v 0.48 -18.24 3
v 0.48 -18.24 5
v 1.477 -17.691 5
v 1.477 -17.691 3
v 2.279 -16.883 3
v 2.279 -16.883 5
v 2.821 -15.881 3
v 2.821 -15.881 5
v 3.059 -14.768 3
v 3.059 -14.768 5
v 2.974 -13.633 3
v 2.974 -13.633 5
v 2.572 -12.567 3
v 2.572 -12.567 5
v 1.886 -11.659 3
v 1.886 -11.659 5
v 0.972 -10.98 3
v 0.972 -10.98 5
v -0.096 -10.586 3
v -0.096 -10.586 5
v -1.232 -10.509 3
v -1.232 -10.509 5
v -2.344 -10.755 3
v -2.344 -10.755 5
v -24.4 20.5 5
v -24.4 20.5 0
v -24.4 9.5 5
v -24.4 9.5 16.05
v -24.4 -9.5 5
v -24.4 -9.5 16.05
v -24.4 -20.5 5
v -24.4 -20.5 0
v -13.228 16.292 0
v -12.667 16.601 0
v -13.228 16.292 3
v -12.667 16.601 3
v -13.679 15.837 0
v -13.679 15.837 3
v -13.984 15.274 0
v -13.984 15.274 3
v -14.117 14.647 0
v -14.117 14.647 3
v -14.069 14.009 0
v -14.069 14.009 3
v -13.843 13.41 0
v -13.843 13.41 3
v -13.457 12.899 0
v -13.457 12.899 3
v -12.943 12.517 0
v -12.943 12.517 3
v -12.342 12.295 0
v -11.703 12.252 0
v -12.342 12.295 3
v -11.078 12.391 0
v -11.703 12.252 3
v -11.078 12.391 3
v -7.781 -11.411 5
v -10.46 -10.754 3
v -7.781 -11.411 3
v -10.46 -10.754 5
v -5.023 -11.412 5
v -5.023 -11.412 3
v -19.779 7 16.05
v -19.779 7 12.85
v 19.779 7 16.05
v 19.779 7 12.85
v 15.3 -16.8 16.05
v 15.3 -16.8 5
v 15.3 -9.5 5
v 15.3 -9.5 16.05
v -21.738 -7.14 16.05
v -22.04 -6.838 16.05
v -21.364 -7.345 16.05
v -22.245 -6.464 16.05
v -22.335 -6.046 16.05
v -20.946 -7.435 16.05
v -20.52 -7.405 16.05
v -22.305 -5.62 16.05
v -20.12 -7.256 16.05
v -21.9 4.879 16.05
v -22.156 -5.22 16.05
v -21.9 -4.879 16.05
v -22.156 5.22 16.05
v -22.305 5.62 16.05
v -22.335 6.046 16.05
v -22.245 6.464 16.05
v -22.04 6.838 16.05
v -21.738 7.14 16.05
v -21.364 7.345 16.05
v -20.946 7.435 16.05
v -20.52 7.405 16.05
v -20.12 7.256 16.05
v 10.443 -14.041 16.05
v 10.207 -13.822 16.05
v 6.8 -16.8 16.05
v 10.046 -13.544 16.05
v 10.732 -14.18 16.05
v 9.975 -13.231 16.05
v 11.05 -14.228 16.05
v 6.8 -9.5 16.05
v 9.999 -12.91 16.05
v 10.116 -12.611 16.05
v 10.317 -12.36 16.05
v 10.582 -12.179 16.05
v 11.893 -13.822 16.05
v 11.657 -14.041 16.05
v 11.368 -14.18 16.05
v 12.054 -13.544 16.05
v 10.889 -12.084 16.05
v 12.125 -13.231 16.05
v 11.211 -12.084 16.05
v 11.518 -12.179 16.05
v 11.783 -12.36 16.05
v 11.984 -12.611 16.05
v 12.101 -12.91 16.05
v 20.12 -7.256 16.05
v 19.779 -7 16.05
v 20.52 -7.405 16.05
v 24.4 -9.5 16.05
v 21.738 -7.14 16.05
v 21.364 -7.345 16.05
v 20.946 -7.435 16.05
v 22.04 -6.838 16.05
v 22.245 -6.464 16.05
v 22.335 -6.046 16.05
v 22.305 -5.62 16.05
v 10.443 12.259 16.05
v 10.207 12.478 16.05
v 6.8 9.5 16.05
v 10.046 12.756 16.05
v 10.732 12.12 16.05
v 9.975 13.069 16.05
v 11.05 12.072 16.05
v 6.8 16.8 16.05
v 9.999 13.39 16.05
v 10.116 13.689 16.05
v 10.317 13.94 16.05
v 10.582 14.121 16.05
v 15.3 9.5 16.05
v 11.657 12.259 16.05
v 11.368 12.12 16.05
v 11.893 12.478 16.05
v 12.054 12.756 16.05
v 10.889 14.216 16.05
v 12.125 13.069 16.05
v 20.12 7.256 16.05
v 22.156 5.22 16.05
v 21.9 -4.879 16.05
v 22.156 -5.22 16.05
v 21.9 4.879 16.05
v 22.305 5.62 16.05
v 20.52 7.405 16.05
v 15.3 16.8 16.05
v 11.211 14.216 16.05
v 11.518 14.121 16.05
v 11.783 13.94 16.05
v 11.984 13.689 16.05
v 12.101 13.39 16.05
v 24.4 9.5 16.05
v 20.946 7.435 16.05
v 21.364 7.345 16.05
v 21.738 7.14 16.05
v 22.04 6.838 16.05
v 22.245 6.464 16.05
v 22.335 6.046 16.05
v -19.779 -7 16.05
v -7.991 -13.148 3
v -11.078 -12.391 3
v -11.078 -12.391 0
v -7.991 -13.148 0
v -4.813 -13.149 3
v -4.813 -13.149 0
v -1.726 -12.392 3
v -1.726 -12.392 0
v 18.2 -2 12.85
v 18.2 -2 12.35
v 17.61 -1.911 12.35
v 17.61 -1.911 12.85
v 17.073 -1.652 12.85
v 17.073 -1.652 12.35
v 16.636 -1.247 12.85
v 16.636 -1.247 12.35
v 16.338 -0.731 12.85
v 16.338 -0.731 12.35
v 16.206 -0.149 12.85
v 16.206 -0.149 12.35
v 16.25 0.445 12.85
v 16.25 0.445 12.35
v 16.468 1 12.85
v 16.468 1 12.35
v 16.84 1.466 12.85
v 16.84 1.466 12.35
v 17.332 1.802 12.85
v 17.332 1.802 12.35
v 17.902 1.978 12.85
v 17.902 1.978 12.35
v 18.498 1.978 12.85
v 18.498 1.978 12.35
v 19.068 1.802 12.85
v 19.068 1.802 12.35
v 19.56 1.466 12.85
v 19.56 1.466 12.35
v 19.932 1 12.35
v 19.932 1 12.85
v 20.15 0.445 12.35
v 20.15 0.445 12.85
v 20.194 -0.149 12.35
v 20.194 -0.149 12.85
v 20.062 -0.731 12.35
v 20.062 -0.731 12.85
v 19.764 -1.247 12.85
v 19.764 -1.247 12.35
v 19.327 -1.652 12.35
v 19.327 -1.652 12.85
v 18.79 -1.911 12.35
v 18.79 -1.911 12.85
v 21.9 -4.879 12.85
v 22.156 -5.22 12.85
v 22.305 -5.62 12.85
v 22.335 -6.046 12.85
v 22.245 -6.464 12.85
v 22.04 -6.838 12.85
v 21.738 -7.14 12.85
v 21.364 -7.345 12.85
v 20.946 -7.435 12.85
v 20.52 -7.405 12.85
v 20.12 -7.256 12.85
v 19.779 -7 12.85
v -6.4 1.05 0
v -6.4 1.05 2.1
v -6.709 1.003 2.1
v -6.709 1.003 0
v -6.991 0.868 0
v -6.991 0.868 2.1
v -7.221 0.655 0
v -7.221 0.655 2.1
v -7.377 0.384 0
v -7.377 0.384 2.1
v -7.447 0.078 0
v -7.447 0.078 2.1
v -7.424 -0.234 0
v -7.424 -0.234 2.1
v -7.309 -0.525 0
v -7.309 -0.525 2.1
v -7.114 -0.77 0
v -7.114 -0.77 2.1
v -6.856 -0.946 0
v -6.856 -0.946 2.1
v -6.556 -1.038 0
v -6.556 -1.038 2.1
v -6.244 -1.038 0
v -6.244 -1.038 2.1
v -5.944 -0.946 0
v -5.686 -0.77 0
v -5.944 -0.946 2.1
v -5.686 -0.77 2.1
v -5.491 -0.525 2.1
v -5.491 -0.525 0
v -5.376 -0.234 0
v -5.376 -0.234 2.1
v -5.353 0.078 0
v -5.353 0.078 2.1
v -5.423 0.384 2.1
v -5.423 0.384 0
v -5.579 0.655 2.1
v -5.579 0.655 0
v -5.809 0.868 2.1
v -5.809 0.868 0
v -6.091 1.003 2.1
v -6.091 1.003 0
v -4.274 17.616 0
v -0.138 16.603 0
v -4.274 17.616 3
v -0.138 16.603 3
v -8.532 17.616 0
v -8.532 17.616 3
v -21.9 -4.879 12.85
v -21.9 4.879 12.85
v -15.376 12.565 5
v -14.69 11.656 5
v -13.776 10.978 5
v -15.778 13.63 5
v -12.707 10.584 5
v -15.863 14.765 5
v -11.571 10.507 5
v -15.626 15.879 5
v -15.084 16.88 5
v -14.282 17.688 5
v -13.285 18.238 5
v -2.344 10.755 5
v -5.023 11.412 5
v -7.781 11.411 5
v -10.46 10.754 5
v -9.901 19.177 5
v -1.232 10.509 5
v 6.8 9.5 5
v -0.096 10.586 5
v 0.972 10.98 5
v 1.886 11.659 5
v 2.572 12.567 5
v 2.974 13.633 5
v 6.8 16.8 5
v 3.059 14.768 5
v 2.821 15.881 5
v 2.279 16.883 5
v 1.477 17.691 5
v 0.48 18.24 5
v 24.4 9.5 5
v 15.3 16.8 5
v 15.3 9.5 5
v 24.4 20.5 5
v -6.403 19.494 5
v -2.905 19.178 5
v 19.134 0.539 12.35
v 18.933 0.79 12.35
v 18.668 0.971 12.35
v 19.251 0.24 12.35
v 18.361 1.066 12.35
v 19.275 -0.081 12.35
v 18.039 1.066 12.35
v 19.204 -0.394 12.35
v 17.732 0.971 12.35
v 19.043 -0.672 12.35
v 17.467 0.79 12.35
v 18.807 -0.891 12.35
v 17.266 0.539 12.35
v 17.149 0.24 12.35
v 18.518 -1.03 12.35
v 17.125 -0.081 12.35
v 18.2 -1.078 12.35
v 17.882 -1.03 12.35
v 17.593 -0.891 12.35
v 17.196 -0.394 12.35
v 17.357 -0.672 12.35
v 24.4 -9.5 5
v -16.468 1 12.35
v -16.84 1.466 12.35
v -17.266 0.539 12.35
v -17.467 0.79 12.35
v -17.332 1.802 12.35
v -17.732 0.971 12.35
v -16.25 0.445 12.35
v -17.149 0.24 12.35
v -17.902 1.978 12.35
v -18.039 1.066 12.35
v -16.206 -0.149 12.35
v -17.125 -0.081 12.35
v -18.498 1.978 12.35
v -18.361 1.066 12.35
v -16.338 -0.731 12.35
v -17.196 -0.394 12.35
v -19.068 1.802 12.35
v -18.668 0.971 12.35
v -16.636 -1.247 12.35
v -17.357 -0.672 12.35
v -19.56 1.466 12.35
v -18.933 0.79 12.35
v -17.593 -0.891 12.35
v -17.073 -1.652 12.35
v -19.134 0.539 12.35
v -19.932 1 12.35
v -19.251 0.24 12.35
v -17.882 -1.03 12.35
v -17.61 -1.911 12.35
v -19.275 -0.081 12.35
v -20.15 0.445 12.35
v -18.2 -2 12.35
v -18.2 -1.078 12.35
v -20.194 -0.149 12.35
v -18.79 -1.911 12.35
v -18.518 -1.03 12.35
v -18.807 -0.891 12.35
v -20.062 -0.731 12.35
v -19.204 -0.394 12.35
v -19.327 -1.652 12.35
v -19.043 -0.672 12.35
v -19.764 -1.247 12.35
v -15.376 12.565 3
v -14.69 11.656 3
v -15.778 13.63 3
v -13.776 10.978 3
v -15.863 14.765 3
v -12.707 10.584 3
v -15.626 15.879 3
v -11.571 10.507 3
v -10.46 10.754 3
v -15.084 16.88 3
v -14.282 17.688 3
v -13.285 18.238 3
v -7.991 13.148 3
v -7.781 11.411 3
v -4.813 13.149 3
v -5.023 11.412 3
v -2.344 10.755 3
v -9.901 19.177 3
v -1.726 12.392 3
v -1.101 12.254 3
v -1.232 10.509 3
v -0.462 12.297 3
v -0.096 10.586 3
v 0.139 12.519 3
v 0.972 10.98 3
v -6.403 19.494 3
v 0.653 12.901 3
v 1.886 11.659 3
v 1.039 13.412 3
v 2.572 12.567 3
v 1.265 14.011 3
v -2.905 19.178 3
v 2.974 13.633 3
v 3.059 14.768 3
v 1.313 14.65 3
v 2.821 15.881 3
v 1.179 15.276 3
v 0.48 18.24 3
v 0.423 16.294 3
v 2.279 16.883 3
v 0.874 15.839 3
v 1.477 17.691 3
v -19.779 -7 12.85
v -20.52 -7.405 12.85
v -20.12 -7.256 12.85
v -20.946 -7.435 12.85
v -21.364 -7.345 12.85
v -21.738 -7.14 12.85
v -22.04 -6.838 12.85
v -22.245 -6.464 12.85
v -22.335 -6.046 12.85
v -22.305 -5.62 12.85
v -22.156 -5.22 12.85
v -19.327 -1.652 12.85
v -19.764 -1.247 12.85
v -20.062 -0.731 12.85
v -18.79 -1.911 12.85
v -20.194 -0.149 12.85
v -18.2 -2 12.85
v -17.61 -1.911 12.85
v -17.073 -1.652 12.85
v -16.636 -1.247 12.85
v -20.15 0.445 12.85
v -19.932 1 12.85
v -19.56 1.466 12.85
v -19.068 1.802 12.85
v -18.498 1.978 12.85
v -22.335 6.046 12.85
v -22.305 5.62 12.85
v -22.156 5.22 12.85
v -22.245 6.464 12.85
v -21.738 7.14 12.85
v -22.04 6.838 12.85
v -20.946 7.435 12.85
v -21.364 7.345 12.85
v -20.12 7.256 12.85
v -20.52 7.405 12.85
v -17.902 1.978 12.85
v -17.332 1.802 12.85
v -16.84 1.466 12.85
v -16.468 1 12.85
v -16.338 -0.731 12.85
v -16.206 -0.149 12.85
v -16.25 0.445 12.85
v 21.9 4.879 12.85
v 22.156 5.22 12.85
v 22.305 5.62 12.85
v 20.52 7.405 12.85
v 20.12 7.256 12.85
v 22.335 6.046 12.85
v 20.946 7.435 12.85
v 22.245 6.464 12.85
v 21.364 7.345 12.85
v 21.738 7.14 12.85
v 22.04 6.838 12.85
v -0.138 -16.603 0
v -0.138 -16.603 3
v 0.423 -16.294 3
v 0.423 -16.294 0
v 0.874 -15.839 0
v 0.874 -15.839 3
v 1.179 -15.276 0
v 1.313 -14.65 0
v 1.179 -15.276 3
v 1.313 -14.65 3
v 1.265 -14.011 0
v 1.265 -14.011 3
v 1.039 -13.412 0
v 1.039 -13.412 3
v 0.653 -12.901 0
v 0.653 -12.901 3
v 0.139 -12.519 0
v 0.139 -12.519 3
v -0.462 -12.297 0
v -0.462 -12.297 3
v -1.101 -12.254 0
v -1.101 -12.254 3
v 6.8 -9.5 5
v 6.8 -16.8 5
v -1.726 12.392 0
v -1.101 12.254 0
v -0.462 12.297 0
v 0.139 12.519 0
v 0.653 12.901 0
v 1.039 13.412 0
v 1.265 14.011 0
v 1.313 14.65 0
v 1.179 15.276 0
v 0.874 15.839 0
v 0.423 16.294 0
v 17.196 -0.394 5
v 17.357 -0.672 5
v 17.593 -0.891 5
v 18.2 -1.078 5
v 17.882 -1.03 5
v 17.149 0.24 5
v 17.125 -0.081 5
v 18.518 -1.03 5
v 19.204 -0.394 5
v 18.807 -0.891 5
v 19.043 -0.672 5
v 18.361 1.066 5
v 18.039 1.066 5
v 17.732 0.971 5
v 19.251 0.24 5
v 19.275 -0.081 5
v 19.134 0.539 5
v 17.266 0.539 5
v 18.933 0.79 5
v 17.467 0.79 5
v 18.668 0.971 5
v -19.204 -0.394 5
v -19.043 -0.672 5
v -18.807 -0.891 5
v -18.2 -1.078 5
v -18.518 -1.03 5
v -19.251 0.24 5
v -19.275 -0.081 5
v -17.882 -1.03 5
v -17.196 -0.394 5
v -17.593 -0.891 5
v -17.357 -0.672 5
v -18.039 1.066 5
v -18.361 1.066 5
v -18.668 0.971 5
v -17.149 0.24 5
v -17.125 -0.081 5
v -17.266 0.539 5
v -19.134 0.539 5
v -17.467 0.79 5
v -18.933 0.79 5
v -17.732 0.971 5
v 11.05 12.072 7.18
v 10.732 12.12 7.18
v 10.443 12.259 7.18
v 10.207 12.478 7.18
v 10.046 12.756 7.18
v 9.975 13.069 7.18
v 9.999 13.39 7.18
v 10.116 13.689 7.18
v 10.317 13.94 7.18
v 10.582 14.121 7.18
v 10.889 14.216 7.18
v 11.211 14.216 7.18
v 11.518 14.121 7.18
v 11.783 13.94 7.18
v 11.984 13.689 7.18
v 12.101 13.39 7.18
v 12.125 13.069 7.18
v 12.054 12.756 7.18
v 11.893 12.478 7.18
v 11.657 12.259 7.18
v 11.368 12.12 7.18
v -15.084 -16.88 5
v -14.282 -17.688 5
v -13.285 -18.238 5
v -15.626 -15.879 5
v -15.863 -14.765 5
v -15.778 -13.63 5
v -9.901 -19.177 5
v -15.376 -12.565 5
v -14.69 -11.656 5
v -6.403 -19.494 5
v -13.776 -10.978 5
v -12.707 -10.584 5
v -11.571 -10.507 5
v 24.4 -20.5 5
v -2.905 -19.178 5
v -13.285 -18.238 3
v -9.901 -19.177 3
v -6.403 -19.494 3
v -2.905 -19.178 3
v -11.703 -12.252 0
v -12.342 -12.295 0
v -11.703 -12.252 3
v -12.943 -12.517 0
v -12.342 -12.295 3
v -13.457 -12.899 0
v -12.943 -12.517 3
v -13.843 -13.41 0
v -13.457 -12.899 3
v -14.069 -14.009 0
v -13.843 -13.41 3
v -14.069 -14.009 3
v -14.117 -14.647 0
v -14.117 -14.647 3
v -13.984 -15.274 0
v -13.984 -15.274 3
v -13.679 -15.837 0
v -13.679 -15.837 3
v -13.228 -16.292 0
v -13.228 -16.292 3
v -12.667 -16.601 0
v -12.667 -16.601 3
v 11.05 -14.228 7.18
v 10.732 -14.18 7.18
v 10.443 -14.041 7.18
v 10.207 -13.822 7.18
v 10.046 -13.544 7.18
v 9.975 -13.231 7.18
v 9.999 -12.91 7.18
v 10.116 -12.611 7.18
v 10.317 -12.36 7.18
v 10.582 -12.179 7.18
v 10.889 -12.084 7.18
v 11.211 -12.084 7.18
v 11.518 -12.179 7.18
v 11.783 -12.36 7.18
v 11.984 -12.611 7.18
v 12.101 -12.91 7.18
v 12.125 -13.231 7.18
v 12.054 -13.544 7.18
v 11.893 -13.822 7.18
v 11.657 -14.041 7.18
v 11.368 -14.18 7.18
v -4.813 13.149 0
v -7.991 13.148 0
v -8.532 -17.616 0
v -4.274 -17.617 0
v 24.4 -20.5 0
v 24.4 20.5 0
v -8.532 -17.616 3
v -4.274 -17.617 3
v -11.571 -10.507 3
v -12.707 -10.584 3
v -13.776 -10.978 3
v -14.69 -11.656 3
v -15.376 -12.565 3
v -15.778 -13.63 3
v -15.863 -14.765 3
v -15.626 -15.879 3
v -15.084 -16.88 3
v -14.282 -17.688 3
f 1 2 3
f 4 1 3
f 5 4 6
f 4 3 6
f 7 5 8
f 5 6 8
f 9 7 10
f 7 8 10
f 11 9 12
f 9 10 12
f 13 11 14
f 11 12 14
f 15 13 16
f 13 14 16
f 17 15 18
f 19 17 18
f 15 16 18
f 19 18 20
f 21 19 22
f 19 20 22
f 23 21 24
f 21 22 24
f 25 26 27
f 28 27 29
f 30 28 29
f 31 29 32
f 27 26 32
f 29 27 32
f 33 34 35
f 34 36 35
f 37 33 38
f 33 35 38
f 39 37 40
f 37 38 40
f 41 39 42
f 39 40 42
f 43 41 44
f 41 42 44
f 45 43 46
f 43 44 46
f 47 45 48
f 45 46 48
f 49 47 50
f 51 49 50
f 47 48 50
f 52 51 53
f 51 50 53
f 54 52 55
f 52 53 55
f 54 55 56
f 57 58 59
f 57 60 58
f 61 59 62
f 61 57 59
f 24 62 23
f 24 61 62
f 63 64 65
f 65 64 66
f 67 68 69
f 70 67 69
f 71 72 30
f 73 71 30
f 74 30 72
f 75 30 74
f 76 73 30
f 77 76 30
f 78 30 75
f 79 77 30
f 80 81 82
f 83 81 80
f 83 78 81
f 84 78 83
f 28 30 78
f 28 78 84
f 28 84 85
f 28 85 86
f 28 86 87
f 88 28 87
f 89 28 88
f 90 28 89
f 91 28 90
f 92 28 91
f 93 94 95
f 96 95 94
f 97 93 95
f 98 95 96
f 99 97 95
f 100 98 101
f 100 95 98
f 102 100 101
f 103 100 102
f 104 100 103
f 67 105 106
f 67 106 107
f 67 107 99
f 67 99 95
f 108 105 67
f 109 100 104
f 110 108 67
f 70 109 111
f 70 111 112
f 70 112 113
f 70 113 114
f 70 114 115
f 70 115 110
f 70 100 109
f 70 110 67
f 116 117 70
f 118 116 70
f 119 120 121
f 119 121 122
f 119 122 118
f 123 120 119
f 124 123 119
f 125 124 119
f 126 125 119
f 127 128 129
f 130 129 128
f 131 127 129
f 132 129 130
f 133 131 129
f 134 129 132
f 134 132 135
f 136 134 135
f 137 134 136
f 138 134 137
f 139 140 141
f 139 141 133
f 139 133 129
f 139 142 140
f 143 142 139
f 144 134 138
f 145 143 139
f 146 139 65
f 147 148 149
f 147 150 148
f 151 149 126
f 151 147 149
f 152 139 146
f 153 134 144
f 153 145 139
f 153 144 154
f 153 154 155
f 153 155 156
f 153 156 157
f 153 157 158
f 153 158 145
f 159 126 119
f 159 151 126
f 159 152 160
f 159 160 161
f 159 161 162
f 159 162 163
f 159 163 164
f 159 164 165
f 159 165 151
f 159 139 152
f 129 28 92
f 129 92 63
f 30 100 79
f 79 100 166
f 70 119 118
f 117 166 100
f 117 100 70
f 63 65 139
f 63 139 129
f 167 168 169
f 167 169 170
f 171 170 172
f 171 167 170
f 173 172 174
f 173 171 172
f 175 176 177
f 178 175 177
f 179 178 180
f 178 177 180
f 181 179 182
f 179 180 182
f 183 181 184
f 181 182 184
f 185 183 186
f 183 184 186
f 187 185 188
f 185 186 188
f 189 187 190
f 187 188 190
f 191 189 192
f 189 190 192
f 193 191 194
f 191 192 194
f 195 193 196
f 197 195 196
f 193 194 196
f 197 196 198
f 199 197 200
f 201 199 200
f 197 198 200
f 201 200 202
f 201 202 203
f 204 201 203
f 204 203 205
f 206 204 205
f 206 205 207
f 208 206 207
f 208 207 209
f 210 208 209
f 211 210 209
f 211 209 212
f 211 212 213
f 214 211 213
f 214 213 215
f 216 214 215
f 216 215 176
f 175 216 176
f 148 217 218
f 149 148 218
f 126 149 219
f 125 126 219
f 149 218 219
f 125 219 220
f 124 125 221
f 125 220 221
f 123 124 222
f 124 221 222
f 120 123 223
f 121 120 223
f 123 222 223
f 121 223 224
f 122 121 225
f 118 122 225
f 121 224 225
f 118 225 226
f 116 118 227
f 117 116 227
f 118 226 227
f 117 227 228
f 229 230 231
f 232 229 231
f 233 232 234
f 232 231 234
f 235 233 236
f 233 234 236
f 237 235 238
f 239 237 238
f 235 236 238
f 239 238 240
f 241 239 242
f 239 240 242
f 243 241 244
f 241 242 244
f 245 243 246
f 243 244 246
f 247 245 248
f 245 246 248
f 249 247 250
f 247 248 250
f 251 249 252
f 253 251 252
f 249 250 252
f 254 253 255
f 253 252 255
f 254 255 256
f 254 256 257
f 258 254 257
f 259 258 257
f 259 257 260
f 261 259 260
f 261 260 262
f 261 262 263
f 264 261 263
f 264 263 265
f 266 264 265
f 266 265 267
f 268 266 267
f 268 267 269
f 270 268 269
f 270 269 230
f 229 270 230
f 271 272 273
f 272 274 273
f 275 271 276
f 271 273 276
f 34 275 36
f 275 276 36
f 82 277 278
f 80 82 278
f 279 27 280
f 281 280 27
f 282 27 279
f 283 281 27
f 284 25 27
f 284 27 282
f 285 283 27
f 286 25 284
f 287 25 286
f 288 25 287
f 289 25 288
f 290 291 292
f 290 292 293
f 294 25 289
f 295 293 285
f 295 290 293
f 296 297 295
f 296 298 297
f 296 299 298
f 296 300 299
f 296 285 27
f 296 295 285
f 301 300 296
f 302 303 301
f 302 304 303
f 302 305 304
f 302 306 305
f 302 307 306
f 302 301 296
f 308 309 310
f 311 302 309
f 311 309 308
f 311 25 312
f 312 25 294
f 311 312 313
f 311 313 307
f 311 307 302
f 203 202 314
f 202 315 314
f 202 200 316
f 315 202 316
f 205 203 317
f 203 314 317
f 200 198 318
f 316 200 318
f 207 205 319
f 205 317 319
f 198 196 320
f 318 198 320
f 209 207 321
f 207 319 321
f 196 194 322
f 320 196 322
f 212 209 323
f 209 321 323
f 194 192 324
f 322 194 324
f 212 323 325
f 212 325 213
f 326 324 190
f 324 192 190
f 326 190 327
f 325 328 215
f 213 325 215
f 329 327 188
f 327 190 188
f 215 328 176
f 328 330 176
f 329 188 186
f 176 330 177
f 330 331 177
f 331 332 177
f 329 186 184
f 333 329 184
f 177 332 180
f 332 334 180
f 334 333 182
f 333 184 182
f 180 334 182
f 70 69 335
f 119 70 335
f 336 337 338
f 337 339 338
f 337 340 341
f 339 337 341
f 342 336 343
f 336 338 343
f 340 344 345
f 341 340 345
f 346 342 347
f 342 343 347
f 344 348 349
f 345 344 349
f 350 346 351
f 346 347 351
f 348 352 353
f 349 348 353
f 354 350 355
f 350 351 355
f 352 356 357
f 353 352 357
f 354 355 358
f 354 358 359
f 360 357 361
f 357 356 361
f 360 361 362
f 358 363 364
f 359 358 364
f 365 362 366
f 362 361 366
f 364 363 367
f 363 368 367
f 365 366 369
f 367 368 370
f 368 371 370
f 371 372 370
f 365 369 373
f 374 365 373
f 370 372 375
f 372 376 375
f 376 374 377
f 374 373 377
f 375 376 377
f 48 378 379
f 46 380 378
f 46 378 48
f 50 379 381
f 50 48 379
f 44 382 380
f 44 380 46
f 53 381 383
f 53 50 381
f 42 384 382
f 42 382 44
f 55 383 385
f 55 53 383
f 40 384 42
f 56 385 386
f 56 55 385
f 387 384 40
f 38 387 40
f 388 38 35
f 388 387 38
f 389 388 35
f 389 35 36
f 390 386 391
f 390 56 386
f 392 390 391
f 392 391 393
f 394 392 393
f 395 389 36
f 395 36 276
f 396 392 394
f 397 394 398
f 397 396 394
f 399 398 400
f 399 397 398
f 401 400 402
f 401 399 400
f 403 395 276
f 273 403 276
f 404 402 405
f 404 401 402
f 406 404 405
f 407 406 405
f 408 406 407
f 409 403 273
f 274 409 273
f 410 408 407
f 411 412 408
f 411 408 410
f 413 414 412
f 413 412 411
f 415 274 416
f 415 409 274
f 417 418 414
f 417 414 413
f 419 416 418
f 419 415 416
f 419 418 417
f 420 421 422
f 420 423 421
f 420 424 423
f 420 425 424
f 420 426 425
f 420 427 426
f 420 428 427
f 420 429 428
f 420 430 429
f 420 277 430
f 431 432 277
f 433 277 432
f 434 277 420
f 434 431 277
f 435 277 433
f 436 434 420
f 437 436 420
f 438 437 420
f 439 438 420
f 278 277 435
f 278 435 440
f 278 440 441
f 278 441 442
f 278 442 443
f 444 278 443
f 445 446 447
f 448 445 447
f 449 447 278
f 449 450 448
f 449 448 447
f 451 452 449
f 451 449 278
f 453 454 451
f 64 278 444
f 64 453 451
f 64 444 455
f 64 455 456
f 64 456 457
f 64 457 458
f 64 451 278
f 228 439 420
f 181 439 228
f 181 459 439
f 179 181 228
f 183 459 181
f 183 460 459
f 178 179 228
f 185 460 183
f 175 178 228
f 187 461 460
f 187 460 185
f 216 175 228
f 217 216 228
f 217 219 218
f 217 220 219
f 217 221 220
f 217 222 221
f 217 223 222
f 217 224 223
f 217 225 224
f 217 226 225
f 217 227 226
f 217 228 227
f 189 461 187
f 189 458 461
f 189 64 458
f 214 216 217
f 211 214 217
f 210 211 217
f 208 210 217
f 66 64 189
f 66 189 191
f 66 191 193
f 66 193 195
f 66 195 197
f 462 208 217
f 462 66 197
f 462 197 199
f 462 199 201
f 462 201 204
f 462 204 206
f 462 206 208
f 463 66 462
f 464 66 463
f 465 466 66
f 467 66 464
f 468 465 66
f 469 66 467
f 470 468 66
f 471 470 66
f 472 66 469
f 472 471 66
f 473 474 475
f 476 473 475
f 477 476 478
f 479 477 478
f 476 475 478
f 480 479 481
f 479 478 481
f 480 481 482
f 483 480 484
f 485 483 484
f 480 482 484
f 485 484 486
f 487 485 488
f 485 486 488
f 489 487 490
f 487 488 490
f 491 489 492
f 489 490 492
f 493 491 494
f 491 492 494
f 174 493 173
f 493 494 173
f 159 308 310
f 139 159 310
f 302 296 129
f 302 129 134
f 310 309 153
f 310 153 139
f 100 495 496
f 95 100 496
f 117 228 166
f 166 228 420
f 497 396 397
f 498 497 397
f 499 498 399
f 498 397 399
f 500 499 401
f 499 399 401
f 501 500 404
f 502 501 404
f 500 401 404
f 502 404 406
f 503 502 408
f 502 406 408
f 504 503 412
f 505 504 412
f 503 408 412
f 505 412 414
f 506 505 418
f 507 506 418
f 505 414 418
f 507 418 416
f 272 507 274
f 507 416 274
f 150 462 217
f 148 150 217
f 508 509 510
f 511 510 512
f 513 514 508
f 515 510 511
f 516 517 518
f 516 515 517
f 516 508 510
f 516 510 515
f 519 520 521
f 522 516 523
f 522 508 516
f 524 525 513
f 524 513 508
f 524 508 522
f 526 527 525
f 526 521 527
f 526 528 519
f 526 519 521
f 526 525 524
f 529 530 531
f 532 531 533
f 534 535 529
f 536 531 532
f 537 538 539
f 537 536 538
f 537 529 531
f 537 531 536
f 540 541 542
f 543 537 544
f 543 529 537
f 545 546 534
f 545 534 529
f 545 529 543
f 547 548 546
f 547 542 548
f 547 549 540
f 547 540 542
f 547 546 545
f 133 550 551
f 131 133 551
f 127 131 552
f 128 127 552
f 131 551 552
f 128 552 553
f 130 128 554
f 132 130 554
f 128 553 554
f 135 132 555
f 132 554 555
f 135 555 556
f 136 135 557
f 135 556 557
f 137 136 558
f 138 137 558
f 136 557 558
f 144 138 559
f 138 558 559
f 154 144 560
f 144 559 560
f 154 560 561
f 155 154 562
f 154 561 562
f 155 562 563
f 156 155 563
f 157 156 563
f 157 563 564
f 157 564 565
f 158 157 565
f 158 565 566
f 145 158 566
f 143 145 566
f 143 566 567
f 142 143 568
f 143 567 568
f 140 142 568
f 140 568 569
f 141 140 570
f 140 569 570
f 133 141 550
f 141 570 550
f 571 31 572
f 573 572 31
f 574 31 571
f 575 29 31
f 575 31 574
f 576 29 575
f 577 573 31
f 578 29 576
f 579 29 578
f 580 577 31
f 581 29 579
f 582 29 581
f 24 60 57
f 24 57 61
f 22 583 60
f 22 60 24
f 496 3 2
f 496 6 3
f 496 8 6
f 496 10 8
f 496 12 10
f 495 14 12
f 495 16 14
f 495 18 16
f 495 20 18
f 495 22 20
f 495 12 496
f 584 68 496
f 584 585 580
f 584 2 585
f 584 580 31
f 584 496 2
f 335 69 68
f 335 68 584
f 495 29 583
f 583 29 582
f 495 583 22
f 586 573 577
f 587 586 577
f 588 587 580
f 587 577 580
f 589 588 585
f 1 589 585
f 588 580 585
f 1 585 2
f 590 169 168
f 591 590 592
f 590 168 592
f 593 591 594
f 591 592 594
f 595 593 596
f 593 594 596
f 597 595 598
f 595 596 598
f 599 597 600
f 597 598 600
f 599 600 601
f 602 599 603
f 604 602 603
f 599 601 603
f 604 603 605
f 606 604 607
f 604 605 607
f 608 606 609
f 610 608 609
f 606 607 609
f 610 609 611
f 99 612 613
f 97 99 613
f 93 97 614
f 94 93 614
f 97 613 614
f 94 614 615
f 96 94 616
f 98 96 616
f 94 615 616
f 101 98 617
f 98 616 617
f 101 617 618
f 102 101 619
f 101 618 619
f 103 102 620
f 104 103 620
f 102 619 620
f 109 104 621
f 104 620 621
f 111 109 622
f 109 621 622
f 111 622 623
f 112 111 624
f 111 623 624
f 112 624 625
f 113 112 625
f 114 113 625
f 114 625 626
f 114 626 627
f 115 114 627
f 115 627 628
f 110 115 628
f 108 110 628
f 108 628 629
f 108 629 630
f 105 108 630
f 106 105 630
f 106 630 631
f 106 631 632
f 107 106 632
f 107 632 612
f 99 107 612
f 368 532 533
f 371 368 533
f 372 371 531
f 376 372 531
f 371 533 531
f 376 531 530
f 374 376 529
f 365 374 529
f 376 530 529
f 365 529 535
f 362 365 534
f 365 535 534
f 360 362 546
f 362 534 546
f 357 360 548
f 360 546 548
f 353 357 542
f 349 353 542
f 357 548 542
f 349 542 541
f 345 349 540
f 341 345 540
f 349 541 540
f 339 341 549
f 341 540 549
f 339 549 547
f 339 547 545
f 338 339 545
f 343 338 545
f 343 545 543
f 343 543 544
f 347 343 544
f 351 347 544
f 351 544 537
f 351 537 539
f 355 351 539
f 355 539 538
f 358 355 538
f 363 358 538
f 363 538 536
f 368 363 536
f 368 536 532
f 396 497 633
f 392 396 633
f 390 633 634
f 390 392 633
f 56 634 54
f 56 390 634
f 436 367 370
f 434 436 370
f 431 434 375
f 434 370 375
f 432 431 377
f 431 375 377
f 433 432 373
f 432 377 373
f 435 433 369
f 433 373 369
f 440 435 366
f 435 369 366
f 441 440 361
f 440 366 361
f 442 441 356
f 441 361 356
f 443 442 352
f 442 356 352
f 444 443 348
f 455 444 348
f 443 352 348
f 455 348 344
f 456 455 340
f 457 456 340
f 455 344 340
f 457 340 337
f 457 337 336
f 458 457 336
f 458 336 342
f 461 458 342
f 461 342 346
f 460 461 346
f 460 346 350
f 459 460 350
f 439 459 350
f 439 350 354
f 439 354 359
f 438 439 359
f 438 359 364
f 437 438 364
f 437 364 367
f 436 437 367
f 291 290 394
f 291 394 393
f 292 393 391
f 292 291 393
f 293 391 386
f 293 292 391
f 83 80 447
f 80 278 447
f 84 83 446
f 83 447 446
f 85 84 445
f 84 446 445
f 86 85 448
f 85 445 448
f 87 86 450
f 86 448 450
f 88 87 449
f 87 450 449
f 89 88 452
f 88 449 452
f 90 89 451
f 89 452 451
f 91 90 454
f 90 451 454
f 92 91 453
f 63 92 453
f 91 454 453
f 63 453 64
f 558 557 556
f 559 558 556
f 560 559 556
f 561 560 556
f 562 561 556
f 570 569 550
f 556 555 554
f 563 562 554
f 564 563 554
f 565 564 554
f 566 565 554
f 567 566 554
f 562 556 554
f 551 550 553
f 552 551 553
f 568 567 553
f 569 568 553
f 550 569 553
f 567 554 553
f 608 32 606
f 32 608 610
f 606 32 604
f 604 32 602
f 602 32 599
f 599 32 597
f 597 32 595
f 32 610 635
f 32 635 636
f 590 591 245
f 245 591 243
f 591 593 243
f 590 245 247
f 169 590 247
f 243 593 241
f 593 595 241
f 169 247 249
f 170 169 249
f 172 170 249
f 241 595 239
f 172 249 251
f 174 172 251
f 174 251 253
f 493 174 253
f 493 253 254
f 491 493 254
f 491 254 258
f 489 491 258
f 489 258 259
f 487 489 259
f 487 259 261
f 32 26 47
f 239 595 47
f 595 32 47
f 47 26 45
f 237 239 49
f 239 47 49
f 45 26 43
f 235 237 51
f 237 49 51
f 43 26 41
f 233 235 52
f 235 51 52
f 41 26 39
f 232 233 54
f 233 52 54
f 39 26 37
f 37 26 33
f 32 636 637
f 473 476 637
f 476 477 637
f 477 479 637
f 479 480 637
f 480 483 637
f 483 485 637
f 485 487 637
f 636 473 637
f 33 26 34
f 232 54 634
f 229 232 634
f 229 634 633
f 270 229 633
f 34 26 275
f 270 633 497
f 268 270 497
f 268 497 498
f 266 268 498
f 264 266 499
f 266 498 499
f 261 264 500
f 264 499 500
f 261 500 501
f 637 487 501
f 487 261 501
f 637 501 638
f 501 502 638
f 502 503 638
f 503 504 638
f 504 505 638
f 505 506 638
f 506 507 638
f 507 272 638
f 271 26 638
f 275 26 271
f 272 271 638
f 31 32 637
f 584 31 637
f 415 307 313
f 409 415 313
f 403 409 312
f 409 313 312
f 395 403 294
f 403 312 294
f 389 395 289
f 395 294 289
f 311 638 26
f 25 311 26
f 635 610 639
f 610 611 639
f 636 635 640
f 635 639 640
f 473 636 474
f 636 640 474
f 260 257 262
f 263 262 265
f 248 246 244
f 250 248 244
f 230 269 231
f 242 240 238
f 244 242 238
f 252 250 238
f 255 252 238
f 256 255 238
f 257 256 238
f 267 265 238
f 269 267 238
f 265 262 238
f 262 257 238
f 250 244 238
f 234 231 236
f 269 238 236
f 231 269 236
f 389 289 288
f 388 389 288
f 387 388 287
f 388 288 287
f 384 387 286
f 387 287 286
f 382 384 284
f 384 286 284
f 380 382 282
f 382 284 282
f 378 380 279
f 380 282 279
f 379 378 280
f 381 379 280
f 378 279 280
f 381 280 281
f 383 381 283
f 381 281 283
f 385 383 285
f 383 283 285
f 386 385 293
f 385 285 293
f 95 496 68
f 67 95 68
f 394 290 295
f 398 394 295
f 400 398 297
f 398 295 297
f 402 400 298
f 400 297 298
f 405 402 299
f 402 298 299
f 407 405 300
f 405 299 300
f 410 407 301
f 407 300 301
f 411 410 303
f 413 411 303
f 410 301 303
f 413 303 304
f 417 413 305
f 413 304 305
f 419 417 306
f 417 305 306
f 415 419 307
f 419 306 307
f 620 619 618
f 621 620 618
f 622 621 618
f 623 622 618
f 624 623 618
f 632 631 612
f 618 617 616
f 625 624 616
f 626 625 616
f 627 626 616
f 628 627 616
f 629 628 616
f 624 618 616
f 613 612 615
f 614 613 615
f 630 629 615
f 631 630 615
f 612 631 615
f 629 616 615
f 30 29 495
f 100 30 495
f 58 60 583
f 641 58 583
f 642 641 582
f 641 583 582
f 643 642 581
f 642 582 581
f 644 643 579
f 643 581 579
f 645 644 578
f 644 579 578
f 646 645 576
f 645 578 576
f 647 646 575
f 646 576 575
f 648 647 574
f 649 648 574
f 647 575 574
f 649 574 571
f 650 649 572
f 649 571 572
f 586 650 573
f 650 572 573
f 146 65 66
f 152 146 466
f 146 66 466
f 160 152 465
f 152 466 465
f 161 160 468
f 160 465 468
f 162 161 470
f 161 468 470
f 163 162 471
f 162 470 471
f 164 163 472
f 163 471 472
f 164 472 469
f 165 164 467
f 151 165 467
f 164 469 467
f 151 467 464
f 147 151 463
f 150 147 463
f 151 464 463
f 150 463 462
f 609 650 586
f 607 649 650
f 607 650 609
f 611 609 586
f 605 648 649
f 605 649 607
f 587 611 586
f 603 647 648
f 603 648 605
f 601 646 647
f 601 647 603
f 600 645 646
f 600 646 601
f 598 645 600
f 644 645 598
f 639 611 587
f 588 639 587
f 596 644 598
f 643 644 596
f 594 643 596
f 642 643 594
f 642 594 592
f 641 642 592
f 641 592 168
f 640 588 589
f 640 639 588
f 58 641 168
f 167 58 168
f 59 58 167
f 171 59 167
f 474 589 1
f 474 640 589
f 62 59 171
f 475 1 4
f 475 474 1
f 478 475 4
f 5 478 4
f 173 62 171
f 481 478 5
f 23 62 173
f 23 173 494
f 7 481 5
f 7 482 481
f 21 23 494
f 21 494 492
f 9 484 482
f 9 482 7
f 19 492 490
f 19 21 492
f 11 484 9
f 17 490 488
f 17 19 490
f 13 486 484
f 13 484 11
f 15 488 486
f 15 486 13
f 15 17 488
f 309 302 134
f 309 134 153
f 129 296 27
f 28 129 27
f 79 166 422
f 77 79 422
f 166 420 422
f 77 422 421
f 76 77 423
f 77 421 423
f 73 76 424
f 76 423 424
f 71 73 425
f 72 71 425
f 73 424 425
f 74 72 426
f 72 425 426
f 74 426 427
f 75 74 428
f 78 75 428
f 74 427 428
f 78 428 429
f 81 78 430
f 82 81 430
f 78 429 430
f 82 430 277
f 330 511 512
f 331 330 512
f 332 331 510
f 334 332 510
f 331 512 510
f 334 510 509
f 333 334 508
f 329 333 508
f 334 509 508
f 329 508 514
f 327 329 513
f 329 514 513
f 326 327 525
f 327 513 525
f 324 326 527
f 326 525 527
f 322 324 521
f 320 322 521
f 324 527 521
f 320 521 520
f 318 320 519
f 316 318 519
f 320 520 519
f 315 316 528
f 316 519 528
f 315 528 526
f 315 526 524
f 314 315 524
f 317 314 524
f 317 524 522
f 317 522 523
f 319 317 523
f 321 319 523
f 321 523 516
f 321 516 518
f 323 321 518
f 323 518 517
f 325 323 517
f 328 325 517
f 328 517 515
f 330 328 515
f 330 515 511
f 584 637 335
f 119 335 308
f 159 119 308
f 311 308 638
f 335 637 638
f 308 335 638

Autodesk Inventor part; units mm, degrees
ref_plane "YZ Plane" through (0, 0, 0) normal (1, 0, 0) x (0, 1, 0)
ref_plane "XZ Plane" through (0, 0, 0) normal (0, 1, 0) x (-1, 0, 0)
ref_plane "XY Plane" through (0, 0, 0) normal (0, 0, 1) x (1, 0, 0)
sketch "Sketch1" plane through (0, 0, 0) normal (0, 0, 1) x (1, 0, 0)
  line L0 (-24.4, -9.5) -> (24.4, -9.5)
  line L1 (24.4, -9.5) -> (24.4, 9.5)
  line L2 (24.4, 9.5) -> (-24.4, 9.5)
  line L3 (-24.4, 9.5) -> (-24.4, -9.5)
  line L4 (-24.4, -9.5) -> (24.4, 9.5) construction
  line L5 (24.4, -9.5) -> (-24.4, 9.5) construction
  point P0 (0, 0)
  dimension "LENGTH" = 48.8
  dimension "WIDTH" = 19
extrude "Extrusion1" add sketch "Sketch1" along normal blind 12.85
sketch "Sketch2" plane through (0, 0, 12.85) normal (0, 0, 1) x (1, 0, 0)
  point P0 (0, 0)
  point P1 (-18.2, 0)
  point P2 (18.2, 0)
  dimension "d11" = 0
  dimension "d12" = 0
  dimension "d13" = 36.4
  dimension "d14" = 18.2
hole "Hole1" at (-18.2, 0, 12.85) at (18.2, 0, 12.85) direction (0, 0, -1) diameter 2.1565 depth 8.87 thread size "4-40 UNC" class "2B" standard "ANSI Unified Screw Threads"
sketch "Sketch3" plane through (0, 0, 12.85) normal (0, 0, 1) x (1, 0, 0)
  point P0 (0, 0)
  point P1 (0, 0)
  dimension "d22" = 0
  dimension "d23" = 0
hole "Hole2" [suppressed]
sketch "Sketch4" plane through (0, 0, 0) normal (0, 0, -1) x (-1, 0, 0)
  line L0 (5.5, 0) -> (4.5, 0) construction
  line L1 (5.5, 1.05) -> (4.5, 1.05)
  line L2 (4.5, -1.05) -> (5.5, -1.05)
  arc A0 (5.5, -1.05) -> (5.5, 1.05) centre (5.5, 0) ccw
  arc A1 (4.5, 1.05) -> (4.5, -1.05) centre (4.5, 0) ccw
  point P0 (0, 0)
  point P1 (-5, 0)
  point P2 (5, 0)
  dimension "d24" = 1
  dimension "d25" = 0
  dimension "d26" = 0
  dimension "d27" = 10
  dimension "d28" = 5
  dimension "d29" = 1.05
hole "Hole3" [suppressed]
extrude "Extrusion2" [suppressed]
sketch "Sketch5" plane through (0, 0, 0) normal (0, 0, 1) x (1, 0, 0)
  line L0 (-24.4, -20.5) -> (24.4, -20.5)
  line L1 (24.4, -20.5) -> (24.4, 20.5)
  line L2 (24.4, 20.5) -> (-24.4, 20.5)
  line L3 (-24.4, 20.5) -> (-24.4, -20.5)
  line L4 (-24.4, -20.5) -> (24.4, 20.5) construction
  line L5 (24.4, -20.5) -> (-24.4, 20.5) construction
  point P0 (0, 0)
  dimension "d39" = 48.8
  dimension "d40" = 41
extrude "Extrusion3" add sketch "Sketch5" along normal blind 5
sketch "Sketch7" plane through (0, 0, 12.85) normal (0, 0, 1) x (1, 0, 0)
  circle A0 centre (18.2, 0) radius 1.0782 projected
  circle A1 centre (-18.2, 0) radius 1.0782 projected
  point P0 (0, 0)
  dimension "d54" = 0
  dimension "d55" = 0
  dimension "d56" = 0
  dimension "d57" = 0
hole "Hole5" at (18.2, 0, 12.85) at (-18.2, 0, 12.85) direction (0, 0, -1) diameter 4 depth 0.5
sketch "Sketch8" plane through (0, 0, 0) normal (0, 0, -1) x (-1, 0, 0)
  line L0 (0, 5.5) -> (0, 4.5) construction
  line L1 (-1.05, 5.5) -> (-1.05, 4.5)
  line L2 (1.05, 4.5) -> (1.05, 5.5)
  arc A0 (1.05, 5.5) -> (-1.05, 5.5) centre (0, 5.5) ccw
  arc A1 (-1.05, 4.5) -> (1.05, 4.5) centre (0, 4.5) ccw
  point P0 (0, 0)
  point P1 (0, -5)
  point P2 (0, 5)
  dimension "d77" = 1
  dimension "d78" = 1.05
  dimension "d79" = 10
  dimension "d80" = 0
  dimension "d81" = 0
  dimension "d82" = 5
hole "Hole6" [suppressed]
extrude "Extrusion4" [suppressed]
sketch "Sketch10" plane through (0, 0, 12.85) normal (0, 0, 1) x (1, 0, 0)
  line L0 (-24.4, -9.5) -> (24.4, -9.5)
  line L1 (24.4, -9.5) -> (24.4, 9.5)
  line L2 (24.4, 9.5) -> (-24.4, 9.5)
  line L3 (-24.4, 9.5) -> (-24.4, -9.5)
  line L4 (-24.4, -9.5) -> (24.4, 9.5) construction
  line L5 (24.4, -9.5) -> (-24.4, 9.5) construction
  line L6 (21.9, -7) -> (-21.9, -7)
  line L7 (-21.9, -7) -> (-21.9, 7)
  line L8 (-21.9, 7) -> (21.9, 7)
  line L9 (21.9, 7) -> (21.9, -7)
  line L10 (21.9, -7) -> (-21.9, 7) construction
  line L11 (-21.9, -7) -> (21.9, 7) construction
  circle A0 centre (-20.8393, 5.9393) radius 1.5
  circle A1 centre (-20.8393, -5.9393) radius 1.5
  circle A2 centre (20.8393, 5.9393) radius 1.5
  circle A3 centre (20.8393, -5.9393) radius 1.5
  line L12 (20.8393, 5.9393) -> (21.9, 7)
  line L13 (21.9, -7) -> (20.8393, -5.9393)
  line L14 (-20.8393, 5.9393) -> (-21.9, 7)
  line L15 (-20.8393, -5.9393) -> (-21.9, -7)
  point P0 (0, 0)
  point P1 (21.9, -4.8787)
  point P2 (19.7787, -7)
  point P3 (-19.7787, -7)
  point P4 (-21.9, -4.8787)
  point P5 (-21.9, 4.8787)
  point P6 (-19.7787, 7)
  point P7 (19.7787, 7)
  point P8 (21.9, 4.8787)
  dimension "d106" = 3
  dimension "d110" = 3
  dimension "d111" = 3
  dimension "d112" = 3
  dimension "d97" = 48.8
  dimension "d98" = 19
  dimension "d99" = 43.8
  dimension "d100" = 14
  dimension "d107" = 45
  dimension "d108" = 45
  dimension "d109" = 45
extrude "Extrusion6" add sketch "Sketch10" along normal blind 3.2
chamfer "Chamfer5" [suppressed]
sketch "Sketch12" plane through (0, 0, 5) normal (0, 0, 1) x (1, 0, 0)
  arc A0 (7.9961, 15.4962) -> (-8.004, 14.5013) centre (9.4196, -136.543) ccw construction
  arc A1 (7.9587, 19.496) -> (-8.4624, 18.4749) centre (9.4196, -136.543) ccw
  arc A2 (8.0336, 11.4964) -> (-7.5457, 10.5276) centre (9.4196, -136.543) ccw
  arc A3 (8.0336, 11.4964) -> (7.9587, 19.496) centre (7.9961, 15.4962) ccw
  arc A4 (-8.4624, 18.4749) -> (-7.5457, 10.5276) centre (-8.004, 14.5013) ccw
  line L0 (24.4, 2.961) -> (24.4, -2.961)
  line L1 (24.4, 0) -> (-24.4, 0)
  line L2 (-24.4, 8.5) -> (-24.4, -8.5)
  arc A5 (7.9961, 15.4962) -> (-8.004, 14.5013) centre (9.4196, -136.543) ccw construction
  arc A6 (7.9751, 17.7461) -> (-8.2619, 16.7364) centre (9.4196, -136.543) ccw
  arc A7 (8.0172, 13.2463) -> (-7.7462, 12.2661) centre (9.4196, -136.543) ccw
  arc A8 (8.0172, 13.2463) -> (7.9751, 17.7461) centre (7.9961, 15.4962) ccw
  arc A9 (-8.2619, 16.7364) -> (-7.7462, 12.2661) centre (-8.004, 14.5013) ccw
  arc A10 (-8.004, -14.5013) -> (7.9961, -15.4962) centre (9.4196, 136.543) ccw construction
  arc A11 (-8.4624, -18.4749) -> (7.9587, -19.496) centre (9.4196, 136.543) ccw
  arc A12 (-7.5457, -10.5276) -> (8.0336, -11.4964) centre (9.4196, 136.543) ccw
  arc A13 (7.9587, -19.496) -> (8.0336, -11.4964) centre (7.9961, -15.4962) ccw
  arc A14 (-7.5457, -10.5276) -> (-8.4624, -18.4749) centre (-8.004, -14.5013) ccw
  arc A15 (-8.004, -14.5013) -> (7.9961, -15.4962) centre (9.4196, 136.543) ccw construction
  arc A16 (-8.2619, -16.7364) -> (7.9751, -17.7461) centre (9.4196, 136.543) ccw
  arc A17 (-7.7462, -12.2661) -> (8.0172, -13.2463) centre (9.4196, 136.543) ccw
  arc A18 (7.9751, -17.7461) -> (8.0172, -13.2463) centre (7.9961, -15.4962) ccw
  arc A19 (-7.7462, -12.2661) -> (-8.2619, -16.7364) centre (-8.004, -14.5013) ccw
  point P0 (0, 0)
  point P1 (-8.004, 12.753)
  point P2 (7.9961, 17.2527)
  point P3 (-6.4165, 14.3405)
  point P4 (9.5836, 18.8402)
  point P5 (-8.004, -12.753)
  point P6 (7.9961, -17.2527)
  point P7 (9.5836, -18.8402)
  point P8 (-6.4165, -14.3405)
  dimension "d118" = 8
  dimension "d122" = 4.5
extrude "Extrusion12" [suppressed]
extrude "Extrusion13" [suppressed]
sketch "Sketch14" plane through (0, 0, 0) normal (0, 0, -1) x (-1, 0, 0)
  point P0 (0, 0)
  point P1 (6.4, 0)
hole "Hole7" at (-6.4, 0, 0) direction (0, 0, 1) diameter 2.1 depth 2.1
sketch "Sketch15" plane through (0, 0, 0) normal (0, 0, -1) x (-1, 0, 0)
  circle A0 centre (6.4, 0) radius 1.05 projected
  circle A1 centre (6.4, 0) radius 19.5
  circle A2 centre (6.4, 0) radius 11.5
  circle A3 centre (6.4, 0) radius 17.75
  circle A4 centre (6.4, 0) radius 13.25
  line L0 (-24.4, 9.5) -> (24.4, 9.5) projected
  line L1 (24.4, 9.5) -> (-24.4, 9.5)
  line L2 (-24.4, -20.5) -> (-24.4, 20.5) projected
  line L3 (24.4, -9.5) -> (-24.4, -9.5) projected
  line L4 (24.4, -9.5) -> (-24.4, -9.5)
  arc A5 (9.3371, 17.5053) -> (5.1369, 17.705) centre (6.4, 0) ccw
  arc A6 (8.5925, 13.0673) -> (5.4572, 13.2164) centre (6.4, 0) ccw
  arc A7 (13.9857, 17.9641) -> (-1.4292, 17.8592) centre (6.4, 0) ccw
  arc A8 (10.8736, 10.5942) -> (1.7828, 10.5324) centre (6.4, 0) ccw
  arc A9 (11.8707, 14.5025) -> (0.9294, 14.5025) centre (6.4, 0) ccw construction
  arc A10 (13.2825, 18.2451) -> (-0.4824, 18.2451) centre (6.4, 0) ccw
  arc A11 (10.4589, 10.7599) -> (2.3412, 10.7599) centre (6.4, 0) ccw
  arc A12 (10.4589, 10.7599) -> (13.2825, 18.2451) centre (11.8707, 14.5025) ccw
  arc A13 (-0.4824, 18.2451) -> (2.3412, 10.7599) centre (0.9294, 14.5025) ccw
  arc A14 (11.8707, 14.5025) -> (0.9294, 14.5025) centre (6.4, 0) ccw construction
  arc A15 (12.6648, 16.6077) -> (0.1352, 16.6077) centre (6.4, 0) ccw
  arc A16 (11.0766, 12.3973) -> (1.7235, 12.3973) centre (6.4, 0) ccw
  arc A17 (11.0766, 12.3973) -> (12.6648, 16.6077) centre (11.8707, 14.5025) ccw
  arc A18 (0.1352, 16.6077) -> (1.7235, 12.3973) centre (0.9294, 14.5025) ccw
  line L5 (24.4, 9.5) -> (24.4, -9.5) projected
  line L6 (24.4, 0) -> (-24.4, 0)
  arc A19 (5.1369, -17.705) -> (9.3371, -17.5053) centre (6.4, 0) ccw
  arc A20 (5.4572, -13.2164) -> (8.5925, -13.0673) centre (6.4, 0) ccw
  arc A21 (-1.4292, -17.8592) -> (13.9857, -17.9641) centre (6.4, 0) ccw
  arc A22 (1.7828, -10.5324) -> (10.8736, -10.5942) centre (6.4, 0) ccw
  arc A23 (0.9294, -14.5025) -> (11.8707, -14.5025) centre (6.4, 0) ccw construction
  arc A24 (-0.4824, -18.2451) -> (13.2825, -18.2451) centre (6.4, 0) ccw
  arc A25 (2.3412, -10.7599) -> (10.4589, -10.7599) centre (6.4, 0) ccw
  arc A26 (13.2825, -18.2451) -> (10.4589, -10.7599) centre (11.8707, -14.5025) ccw
  arc A27 (2.3412, -10.7599) -> (-0.4824, -18.2451) centre (0.9294, -14.5025) ccw
  arc A28 (0.9294, -14.5025) -> (11.8707, -14.5025) centre (6.4, 0) ccw construction
  arc A29 (0.1352, -16.6077) -> (12.6648, -16.6077) centre (6.4, 0) ccw
  arc A30 (1.7235, -12.3973) -> (11.0766, -12.3973) centre (6.4, 0) ccw
  arc A31 (12.6648, -16.6077) -> (11.0766, -12.3973) centre (11.8707, -14.5025) ccw
  arc A32 (1.7235, -12.3973) -> (0.1352, -16.6077) centre (0.9294, -14.5025) ccw
  point P0 (0, 0)
  point P1 (-24.4, -19.5)
  point P2 (-24.4, 19.5)
  point P3 (24.4, 8.5)
  point P4 (24.4, -8.5)
  point P5 (6.4, 15.5)
  point P6 (6.4, -15.5)
  dimension "d140" = 39
  dimension "d141" = 23
  dimension "d142" = 35.5
  dimension "d143" = 26.5
  dimension "d147" = 8
  dimension "d148" = 4.5
sketch "Sketch17" plane through (0, 0, 5) normal (0, 0, 1) x (1, 0, 0)
  circle A0 centre (-6.4, 0) radius 1.05 projected
  arc A1 (-11.8725, -14.4958) -> (-0.9318, -14.4974) centre (-6.4, 0) ccw construction
  arc A2 (-12.6672, -16.6008) -> (-0.1378, -16.6026) centre (-6.4, 0) ccw
  arc A3 (-11.0779, -12.3908) -> (-1.7259, -12.3922) centre (-6.4, 0) ccw
  arc A4 (-11.0779, -12.3908) -> (-12.6672, -16.6008) centre (-11.8725, -14.4958) ccw
  arc A5 (-0.1378, -16.6026) -> (-1.7259, -12.3922) centre (-0.9318, -14.4974) ccw
  arc A6 (-11.8725, -14.4958) -> (-0.9318, -14.4974) centre (-6.4, 0) ccw construction
  arc A7 (-13.2853, -18.238) -> (0.4798, -18.24) centre (-6.4, 0) ccw
  arc A8 (-10.4598, -10.7536) -> (-2.3435, -10.7548) centre (-6.4, 0) ccw
  arc A9 (-10.4598, -10.7536) -> (-13.2853, -18.238) centre (-11.8725, -14.4958) ccw
  arc A10 (0.4798, -18.24) -> (-2.3435, -10.7548) centre (-0.9318, -14.4974) ccw
  line L0 (-24.1444, 0) -> (24.3913, 0)
  line L1 (24.3913, 0) -> (-24.1444, 0)
  arc A11 (-0.9318, 14.4974) -> (-11.8725, 14.4958) centre (-6.4, 0) ccw construction
  arc A12 (-0.1378, 16.6026) -> (-12.6672, 16.6008) centre (-6.4, 0) ccw
  arc A13 (-1.7259, 12.3922) -> (-11.0779, 12.3908) centre (-6.4, 0) ccw
  arc A14 (-12.6672, 16.6008) -> (-11.0779, 12.3908) centre (-11.8725, 14.4958) ccw
  arc A15 (-1.7259, 12.3922) -> (-0.1378, 16.6026) centre (-0.9318, 14.4974) ccw
  arc A16 (-0.9318, 14.4974) -> (-11.8725, 14.4958) centre (-6.4, 0) ccw construction
  arc A17 (0.4798, 18.24) -> (-13.2853, 18.238) centre (-6.4, 0) ccw
  arc A18 (-2.3435, 10.7548) -> (-10.4598, 10.7536) centre (-6.4, 0) ccw
  arc A19 (-13.2853, 18.238) -> (-10.4598, 10.7536) centre (-11.8725, 14.4958) ccw
  arc A20 (-2.3435, 10.7548) -> (0.4798, 18.24) centre (-0.9318, 14.4974) ccw
  point P0 (0, 0)
  point P1 (-0.9324, -14.4958)
  point P2 (-0.9324, 14.4958)
  dimension "d149" = 4.5
  dimension "d150" = 8
extrude "Extrusion14" cut sketch "Sketch17" against normal through all contours A4 A3 A5 A2 | A15 A13 A14 A12
extrude "Extrusion15" cut sketch "Sketch17" against normal blind 2 contours A9 A8 A10 A7 | A20 A18 A19 A17
sketch "Sketch19" plane through (0, 0, 5) normal (0, 0, 1) x (1, 0, 0)
  line L0 (24.4, -9.5) -> (15.3, -9.5) construction
  line L1 (-24.4, -9.5) -> (24.4, -9.5) construction
  line L2 (15.3, -9.5) -> (6.8, -9.5)
  line L3 (6.8, -9.5) -> (6.8, -16.8)
  line L4 (6.8, -16.8) -> (15.3, -16.8)
  line L5 (15.3, -16.8) -> (15.3, -9.5)
  point P0 (0, 0)
  dimension "d155" = 9.1
  dimension "d156" = 8.5
  dimension "d157" = 7.3
extrude "Extrusion16" add sketch "Sketch19" along normal blind 11.05
sketch "Sketch20" plane through (0, 0, 5) normal (0, 0, 1) x (1, 0, 0)
  line L0 (24.4, 9.5) -> (24.4, 20.5) construction
  line L1 (24.4, 9.5) -> (15.3, 9.5) construction
  line L2 (24.4, 9.5) -> (-24.4, 9.5) construction
  line L3 (15.3, 9.5) -> (6.8, 9.5)
  line L4 (6.8, 9.5) -> (6.8, 16.8)
  line L5 (6.8, 16.8) -> (15.3, 16.8)
  line L6 (15.3, 16.8) -> (15.3, 9.5)
  point P0 (0, 0)
  dimension "d160" = 9.1
  dimension "d161" = 8.5
  dimension "d162" = 7.3
extrude "Extrusion17" add sketch "Sketch20" along normal blind 11.05
sketch "Sketch21" plane through (0, 0, 16.05) normal (0, 0, 1) x (1, 0, 0)
  line L0 (15.3, 16.8) -> (6.8, 16.8) construction
  line L1 (6.8, 16.8) -> (11.05, 16.8) construction
  line L2 (11.05, 16.8) -> (11.05, 13.15) construction
  line L3 (11.05, 13.15) -> (6.8, 13.15) construction
  line L4 (6.8, 13.15) -> (6.8, 16.8) construction
  line L5 (6.8, -9.5) -> (6.8, -16.8) construction
  line L6 (6.8, -9.5) -> (11.05, -9.5) construction
  line L7 (11.05, -9.5) -> (11.05, -13.15) construction
  line L8 (11.05, -13.15) -> (6.8, -13.15) construction
  line L9 (6.8, -13.15) -> (6.8, -9.5) construction
  point P0 (0, 0)
  dimension "d165" = 3.65
hole "Hole8" at (11.05, 13.15, 16.05) at (11.05, -13.15, 16.05) direction (0, 0, -1) diameter 2.1565 depth 8.87 thread size "4-40 UNC" class "2B" standard "ANSI Unified Screw Threads"
equation "\"d2\" = BEAM_HEIGHT - APERTURE_HEIGHT"
equation "\"d14\" = 0.5 * d13"
equation "\"d39\" = LENGTH"
equation "\"d106\" = d110"
equation "\"d111\" = d110"
equation "\"d112\" = d110"
equation "\"d97\" = LENGTH"
equation "\"d98\" = WIDTH"
equation "\"BEAM_HEIGHT\" = 19.05"
equation "\"APERTURE_HEIGHT\" = 6.2"
properties part number "ADAPTER_AOM-brimrose"
